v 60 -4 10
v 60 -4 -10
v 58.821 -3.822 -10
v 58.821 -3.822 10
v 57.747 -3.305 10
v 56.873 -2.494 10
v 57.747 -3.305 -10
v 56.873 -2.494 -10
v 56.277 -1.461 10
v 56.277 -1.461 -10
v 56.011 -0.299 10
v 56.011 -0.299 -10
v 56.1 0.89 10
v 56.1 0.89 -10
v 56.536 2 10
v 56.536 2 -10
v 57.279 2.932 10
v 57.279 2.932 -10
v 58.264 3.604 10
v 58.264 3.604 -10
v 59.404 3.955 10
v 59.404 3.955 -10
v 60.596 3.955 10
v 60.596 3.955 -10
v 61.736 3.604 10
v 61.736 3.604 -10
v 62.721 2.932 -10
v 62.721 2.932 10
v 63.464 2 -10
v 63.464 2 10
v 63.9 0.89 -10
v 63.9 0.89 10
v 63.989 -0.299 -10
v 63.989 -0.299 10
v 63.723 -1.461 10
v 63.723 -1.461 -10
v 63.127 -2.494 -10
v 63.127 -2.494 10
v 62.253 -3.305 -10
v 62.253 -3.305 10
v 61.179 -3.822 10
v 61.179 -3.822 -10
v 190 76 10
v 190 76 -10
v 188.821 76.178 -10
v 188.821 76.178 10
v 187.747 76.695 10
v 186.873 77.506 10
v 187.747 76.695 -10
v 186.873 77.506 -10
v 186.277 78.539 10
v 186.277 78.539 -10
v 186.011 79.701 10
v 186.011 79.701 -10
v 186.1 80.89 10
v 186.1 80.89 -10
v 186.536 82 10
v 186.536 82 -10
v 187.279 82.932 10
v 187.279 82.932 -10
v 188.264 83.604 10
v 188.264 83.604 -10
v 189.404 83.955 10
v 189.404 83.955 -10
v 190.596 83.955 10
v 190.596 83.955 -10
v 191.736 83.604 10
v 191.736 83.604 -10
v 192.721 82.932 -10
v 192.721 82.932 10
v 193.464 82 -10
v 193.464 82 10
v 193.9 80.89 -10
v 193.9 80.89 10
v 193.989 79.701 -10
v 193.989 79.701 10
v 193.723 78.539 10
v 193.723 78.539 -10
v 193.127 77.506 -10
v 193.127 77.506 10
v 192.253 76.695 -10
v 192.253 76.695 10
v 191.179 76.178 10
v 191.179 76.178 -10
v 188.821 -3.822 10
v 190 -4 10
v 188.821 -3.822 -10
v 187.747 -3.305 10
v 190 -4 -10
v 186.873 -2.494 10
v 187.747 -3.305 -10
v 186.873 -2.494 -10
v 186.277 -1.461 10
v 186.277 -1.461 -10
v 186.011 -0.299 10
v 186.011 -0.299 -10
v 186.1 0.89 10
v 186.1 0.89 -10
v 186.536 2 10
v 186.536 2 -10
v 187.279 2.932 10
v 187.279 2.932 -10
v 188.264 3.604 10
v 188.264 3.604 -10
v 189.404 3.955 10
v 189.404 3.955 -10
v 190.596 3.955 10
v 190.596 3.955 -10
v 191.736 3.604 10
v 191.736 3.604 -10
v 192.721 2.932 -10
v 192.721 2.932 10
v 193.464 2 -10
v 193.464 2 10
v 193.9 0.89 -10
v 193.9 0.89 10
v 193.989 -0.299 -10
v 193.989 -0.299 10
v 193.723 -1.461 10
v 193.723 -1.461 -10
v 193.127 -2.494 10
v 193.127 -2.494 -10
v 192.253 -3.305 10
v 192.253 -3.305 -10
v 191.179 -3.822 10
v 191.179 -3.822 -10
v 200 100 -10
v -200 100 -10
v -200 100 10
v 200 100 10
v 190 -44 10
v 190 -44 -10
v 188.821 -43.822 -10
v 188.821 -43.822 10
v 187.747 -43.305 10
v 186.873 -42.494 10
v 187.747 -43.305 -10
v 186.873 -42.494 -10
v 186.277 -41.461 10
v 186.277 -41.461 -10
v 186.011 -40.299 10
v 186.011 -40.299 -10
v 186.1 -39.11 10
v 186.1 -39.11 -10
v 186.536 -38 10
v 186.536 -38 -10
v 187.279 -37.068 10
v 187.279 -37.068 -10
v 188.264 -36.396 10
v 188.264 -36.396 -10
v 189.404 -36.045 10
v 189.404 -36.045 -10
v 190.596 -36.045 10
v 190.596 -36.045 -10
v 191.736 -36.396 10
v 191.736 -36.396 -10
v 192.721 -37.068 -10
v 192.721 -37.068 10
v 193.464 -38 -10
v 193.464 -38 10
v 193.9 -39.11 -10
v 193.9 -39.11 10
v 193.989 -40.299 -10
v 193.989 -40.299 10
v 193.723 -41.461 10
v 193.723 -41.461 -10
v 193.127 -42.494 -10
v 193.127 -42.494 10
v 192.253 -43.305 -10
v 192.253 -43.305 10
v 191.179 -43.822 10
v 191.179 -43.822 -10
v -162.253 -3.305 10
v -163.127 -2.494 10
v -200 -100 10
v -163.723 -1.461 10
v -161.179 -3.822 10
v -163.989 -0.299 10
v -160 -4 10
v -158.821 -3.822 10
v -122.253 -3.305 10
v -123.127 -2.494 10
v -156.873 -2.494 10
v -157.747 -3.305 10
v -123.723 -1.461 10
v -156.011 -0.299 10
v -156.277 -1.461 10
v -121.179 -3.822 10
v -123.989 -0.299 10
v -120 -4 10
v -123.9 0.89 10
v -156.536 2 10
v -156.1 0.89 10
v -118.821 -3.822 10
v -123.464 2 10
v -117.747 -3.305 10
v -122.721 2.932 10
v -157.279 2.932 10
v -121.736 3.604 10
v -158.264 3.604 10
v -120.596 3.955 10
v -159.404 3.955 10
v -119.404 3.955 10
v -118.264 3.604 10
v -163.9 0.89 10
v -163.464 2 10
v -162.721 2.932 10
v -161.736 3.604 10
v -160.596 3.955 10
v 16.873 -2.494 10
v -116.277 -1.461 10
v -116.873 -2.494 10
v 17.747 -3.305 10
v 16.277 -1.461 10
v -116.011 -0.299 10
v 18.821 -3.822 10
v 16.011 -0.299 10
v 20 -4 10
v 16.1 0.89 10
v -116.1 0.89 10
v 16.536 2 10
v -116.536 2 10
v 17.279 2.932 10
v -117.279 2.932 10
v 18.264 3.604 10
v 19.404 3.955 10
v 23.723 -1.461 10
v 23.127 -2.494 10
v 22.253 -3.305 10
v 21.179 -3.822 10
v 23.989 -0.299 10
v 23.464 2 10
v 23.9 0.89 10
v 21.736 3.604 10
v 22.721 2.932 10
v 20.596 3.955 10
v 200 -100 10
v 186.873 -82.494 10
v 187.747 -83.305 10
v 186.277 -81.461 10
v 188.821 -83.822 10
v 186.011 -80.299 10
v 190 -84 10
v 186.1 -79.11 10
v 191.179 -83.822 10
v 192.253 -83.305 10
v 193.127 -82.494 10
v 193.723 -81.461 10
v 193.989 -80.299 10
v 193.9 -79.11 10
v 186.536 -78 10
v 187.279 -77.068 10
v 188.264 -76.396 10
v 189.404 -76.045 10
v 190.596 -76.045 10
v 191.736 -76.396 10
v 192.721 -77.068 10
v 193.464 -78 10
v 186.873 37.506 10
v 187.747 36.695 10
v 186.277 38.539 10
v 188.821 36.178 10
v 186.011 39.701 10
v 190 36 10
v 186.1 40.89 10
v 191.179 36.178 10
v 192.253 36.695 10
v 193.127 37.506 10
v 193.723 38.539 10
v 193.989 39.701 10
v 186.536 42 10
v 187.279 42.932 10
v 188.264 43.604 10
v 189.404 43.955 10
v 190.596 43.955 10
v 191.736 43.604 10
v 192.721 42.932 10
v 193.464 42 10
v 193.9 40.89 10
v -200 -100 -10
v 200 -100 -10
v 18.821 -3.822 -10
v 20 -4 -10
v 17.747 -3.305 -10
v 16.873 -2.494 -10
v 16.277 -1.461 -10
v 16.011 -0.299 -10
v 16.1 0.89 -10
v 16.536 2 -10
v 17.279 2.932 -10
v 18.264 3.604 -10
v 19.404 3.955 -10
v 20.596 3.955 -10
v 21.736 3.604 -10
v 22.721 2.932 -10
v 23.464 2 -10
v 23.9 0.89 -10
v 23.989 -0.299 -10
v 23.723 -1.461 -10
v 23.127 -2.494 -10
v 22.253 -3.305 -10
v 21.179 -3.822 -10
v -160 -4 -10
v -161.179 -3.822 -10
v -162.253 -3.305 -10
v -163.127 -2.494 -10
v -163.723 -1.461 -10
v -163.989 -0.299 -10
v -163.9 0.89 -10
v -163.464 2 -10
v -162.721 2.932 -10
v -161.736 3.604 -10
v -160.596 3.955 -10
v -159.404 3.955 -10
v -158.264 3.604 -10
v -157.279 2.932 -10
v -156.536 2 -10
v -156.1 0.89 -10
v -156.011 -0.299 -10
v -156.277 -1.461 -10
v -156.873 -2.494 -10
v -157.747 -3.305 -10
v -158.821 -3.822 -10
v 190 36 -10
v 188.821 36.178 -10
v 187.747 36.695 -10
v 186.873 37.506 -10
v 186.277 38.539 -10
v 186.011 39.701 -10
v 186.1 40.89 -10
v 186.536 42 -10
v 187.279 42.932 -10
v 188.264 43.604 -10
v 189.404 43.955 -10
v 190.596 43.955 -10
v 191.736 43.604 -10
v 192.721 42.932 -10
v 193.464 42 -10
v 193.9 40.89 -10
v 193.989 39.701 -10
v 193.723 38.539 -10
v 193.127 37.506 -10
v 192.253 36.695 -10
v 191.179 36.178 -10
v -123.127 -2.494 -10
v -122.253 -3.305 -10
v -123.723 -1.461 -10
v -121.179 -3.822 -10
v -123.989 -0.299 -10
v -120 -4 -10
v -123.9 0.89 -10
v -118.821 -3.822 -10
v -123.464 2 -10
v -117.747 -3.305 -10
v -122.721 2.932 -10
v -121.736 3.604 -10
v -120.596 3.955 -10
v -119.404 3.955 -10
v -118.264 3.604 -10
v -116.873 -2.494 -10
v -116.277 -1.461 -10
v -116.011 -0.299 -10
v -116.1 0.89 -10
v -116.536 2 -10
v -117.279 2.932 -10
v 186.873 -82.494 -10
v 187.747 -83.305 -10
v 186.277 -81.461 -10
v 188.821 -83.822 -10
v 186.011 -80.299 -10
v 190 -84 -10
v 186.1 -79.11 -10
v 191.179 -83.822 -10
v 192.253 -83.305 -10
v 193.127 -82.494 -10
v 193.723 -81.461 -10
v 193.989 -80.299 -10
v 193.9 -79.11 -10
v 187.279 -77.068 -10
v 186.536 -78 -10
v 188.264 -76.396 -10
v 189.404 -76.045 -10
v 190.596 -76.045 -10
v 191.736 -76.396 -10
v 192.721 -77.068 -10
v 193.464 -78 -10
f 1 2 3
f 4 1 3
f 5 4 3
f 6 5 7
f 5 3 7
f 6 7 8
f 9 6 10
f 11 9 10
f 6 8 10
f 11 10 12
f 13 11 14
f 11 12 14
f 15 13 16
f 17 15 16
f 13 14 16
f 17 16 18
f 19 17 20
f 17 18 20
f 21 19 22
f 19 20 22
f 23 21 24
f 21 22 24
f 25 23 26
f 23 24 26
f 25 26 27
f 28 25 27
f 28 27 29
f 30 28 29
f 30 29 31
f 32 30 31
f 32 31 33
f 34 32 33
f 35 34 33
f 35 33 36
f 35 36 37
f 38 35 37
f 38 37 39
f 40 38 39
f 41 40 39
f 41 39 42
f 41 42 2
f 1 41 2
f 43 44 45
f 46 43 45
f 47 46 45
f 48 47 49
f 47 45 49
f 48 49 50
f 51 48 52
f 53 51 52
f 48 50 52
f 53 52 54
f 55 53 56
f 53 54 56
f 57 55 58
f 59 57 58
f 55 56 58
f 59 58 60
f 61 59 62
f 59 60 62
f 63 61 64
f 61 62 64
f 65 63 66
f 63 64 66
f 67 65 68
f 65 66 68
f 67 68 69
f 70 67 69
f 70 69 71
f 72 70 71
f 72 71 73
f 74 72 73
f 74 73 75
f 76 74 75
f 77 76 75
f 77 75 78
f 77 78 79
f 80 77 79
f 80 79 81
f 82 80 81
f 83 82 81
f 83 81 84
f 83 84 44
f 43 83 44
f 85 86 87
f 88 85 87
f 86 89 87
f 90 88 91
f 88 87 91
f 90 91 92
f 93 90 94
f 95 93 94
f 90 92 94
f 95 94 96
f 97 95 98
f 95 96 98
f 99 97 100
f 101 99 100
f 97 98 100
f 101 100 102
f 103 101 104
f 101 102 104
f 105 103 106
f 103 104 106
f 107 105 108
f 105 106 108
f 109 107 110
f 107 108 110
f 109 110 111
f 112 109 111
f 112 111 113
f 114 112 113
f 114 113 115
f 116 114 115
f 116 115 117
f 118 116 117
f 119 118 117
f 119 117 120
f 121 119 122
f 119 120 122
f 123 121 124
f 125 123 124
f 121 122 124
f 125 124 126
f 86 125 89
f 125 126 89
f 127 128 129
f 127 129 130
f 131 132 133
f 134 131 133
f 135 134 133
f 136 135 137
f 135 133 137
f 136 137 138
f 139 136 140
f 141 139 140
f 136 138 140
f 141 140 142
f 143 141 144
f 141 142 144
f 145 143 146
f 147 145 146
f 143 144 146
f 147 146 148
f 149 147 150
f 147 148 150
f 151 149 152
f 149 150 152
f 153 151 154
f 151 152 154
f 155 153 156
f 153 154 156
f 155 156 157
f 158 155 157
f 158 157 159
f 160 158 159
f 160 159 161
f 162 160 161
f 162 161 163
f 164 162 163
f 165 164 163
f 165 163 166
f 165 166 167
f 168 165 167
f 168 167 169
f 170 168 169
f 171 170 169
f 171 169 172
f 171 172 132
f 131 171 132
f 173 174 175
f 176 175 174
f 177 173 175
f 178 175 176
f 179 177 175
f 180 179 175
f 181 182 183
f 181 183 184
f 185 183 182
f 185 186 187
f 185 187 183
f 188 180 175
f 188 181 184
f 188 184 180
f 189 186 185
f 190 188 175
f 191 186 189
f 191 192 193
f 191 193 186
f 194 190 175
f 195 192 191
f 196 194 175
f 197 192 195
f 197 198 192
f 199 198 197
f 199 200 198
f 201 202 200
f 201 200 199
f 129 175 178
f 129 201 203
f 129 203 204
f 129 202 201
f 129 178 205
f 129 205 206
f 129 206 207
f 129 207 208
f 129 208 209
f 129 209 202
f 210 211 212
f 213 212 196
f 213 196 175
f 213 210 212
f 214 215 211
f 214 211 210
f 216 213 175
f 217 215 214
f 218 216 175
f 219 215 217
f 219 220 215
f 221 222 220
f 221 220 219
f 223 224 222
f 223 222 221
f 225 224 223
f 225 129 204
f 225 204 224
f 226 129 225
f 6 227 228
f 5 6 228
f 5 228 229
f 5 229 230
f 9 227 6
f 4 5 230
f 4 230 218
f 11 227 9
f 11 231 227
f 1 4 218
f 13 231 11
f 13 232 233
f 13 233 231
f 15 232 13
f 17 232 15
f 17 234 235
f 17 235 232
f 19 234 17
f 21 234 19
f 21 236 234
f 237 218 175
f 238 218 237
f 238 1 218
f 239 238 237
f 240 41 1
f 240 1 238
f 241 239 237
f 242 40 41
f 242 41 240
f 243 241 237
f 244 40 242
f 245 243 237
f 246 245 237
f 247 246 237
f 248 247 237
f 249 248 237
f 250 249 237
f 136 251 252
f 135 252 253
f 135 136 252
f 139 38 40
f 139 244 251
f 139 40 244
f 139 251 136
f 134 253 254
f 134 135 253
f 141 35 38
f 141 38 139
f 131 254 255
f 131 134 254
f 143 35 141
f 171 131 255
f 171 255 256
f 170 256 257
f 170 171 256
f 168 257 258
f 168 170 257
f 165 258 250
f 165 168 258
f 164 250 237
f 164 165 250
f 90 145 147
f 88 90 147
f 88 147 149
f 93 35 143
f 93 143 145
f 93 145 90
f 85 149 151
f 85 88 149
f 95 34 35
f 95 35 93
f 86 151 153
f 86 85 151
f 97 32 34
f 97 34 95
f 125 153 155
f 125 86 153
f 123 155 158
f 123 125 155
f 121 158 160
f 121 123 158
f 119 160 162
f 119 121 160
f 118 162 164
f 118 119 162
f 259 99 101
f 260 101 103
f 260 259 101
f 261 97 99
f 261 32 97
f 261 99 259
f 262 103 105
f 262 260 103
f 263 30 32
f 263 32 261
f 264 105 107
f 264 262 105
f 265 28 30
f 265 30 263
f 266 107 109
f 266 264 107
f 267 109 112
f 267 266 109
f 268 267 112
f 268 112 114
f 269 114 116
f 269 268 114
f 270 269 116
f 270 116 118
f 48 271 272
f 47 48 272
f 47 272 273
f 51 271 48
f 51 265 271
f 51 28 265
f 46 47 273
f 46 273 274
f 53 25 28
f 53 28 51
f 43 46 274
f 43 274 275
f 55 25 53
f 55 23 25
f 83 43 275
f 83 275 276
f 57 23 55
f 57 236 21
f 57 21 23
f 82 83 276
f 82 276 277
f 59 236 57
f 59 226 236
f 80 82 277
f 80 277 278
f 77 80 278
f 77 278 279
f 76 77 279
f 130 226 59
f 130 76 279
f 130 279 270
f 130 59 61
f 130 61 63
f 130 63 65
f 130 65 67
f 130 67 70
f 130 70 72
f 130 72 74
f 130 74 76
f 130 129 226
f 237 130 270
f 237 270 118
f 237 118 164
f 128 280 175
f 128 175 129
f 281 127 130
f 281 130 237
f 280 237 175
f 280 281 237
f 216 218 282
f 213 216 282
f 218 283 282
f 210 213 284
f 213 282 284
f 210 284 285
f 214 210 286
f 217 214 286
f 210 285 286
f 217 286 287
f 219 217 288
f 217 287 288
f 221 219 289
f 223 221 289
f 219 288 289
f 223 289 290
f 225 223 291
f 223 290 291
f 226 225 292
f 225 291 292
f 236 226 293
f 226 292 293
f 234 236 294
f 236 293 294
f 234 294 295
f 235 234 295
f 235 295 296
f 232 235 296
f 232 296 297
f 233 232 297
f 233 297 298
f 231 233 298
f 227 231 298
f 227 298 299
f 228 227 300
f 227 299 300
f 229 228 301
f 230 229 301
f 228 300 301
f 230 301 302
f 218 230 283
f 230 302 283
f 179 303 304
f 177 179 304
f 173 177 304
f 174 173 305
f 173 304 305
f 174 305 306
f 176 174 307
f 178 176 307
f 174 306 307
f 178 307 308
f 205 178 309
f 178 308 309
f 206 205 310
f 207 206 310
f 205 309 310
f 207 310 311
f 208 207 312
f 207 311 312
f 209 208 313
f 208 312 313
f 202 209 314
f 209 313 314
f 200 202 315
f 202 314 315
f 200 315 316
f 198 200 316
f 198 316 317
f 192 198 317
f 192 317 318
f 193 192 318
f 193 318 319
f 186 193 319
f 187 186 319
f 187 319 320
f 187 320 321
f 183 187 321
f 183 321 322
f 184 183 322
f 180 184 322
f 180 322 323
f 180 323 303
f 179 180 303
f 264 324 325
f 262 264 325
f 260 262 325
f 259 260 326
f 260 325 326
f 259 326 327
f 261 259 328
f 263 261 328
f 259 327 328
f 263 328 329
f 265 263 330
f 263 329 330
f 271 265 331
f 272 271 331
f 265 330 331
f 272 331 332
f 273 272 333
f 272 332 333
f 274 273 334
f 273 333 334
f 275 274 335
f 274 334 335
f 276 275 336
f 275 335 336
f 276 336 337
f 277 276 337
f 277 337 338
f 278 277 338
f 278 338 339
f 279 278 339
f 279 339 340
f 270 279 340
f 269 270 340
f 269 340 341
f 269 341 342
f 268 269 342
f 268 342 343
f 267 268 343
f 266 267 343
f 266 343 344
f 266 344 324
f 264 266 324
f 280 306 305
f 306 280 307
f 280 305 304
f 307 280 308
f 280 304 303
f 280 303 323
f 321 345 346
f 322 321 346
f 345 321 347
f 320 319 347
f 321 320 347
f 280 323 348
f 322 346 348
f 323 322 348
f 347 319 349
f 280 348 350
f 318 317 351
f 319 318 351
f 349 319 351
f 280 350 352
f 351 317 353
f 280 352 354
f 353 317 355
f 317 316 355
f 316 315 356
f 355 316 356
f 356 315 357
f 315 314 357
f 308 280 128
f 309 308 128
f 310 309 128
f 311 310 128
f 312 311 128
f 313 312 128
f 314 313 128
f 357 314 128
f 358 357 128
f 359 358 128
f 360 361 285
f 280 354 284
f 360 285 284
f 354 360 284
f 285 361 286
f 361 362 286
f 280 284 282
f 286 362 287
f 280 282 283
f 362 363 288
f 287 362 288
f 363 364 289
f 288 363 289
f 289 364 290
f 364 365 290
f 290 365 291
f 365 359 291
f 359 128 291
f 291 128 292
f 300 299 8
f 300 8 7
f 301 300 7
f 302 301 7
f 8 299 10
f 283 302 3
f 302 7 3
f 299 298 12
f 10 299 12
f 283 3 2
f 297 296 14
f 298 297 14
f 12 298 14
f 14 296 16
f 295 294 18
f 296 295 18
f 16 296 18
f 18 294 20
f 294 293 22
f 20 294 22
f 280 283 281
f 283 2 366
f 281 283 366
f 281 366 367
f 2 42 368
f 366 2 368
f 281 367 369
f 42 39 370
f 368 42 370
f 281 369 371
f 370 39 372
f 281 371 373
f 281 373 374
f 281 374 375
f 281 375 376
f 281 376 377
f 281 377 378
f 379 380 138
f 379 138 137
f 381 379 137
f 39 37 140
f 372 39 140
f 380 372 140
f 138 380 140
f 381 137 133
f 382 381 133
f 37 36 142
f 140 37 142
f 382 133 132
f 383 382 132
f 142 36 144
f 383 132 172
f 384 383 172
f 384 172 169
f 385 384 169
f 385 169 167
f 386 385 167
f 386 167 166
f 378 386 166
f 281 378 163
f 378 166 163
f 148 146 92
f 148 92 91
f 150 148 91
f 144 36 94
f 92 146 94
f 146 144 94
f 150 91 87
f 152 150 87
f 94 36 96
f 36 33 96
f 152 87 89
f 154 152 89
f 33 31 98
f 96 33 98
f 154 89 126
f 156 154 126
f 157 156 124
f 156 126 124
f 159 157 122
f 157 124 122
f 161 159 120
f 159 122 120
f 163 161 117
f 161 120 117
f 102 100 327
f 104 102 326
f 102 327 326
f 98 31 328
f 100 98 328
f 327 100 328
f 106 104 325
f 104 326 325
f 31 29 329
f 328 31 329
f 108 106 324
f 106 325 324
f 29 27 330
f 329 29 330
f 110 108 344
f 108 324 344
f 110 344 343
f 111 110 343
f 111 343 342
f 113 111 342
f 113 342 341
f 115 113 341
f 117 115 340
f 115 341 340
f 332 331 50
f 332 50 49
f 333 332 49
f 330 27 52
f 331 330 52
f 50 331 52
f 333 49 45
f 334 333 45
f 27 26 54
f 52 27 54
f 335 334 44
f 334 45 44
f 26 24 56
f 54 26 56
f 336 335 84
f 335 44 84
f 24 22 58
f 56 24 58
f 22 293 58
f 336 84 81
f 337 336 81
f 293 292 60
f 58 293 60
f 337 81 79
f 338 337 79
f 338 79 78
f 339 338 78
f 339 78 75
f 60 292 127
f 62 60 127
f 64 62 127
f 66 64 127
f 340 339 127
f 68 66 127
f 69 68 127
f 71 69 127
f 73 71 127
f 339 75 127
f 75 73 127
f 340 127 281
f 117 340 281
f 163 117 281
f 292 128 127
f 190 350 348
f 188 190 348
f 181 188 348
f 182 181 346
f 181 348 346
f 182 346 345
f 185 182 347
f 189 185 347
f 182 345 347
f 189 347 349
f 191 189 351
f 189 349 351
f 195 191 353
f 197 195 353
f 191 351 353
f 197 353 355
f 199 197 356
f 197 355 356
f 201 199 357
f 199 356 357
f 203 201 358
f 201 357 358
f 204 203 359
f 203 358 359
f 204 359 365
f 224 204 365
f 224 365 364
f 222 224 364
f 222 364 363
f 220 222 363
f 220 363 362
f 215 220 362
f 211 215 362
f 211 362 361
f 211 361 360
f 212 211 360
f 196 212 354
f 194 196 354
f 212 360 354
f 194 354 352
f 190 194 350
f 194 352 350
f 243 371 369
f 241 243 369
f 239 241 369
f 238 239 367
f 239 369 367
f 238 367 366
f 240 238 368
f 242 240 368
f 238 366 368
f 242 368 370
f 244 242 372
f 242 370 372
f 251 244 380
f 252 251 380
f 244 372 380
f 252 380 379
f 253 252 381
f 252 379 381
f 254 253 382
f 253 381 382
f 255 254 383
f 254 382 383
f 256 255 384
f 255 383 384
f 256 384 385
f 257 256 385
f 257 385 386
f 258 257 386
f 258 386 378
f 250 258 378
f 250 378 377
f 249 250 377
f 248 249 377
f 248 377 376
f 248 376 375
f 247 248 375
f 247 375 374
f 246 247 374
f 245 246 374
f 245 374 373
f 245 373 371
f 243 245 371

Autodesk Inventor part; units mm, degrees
ref_plane "YZ Plane" through (0, 0, 0) normal (1, 0, 0) x (0, 1, 0)
ref_plane "XZ Plane" through (0, 0, 0) normal (0, 1, 0) x (-1, 0, 0)
ref_plane "XY Plane" through (0, 0, 0) normal (0, 0, 1) x (1, 0, 0)
sketch "Sketch1" plane through (0, 0, 0) normal (0, 0, 1) x (1, 0, 0)
  line L0 (-200, 100) -> (200, 100)
  line L1 (200, 100) -> (200, -100)
  line L2 (200, -100) -> (-200, -100)
  line L3 (-200, -100) -> (-200, 100)
  point P0 (0, 0)
  point P1 (0, 100)
  point P2 (-200, 0)
  dimension "d0" = 400
  dimension "d1" = 200
extrude "Extrusion1" add sketch "Sketch1" along normal mid plane 20
sketch "Sketch10" plane through (0, 0, 10) normal (0, 0, 1) x (1, 0, 0)
  line L0 (-200, 100) -> (-200, -100) projected
  point P0 (0, 0)
  point P1 (-160, 0)
  dimension "d53" = 40
hole "Hole1" at (-160, 0, 10) direction (0, 0, -1) diameter 8 end through all
pattern_linear "Rectangular Pattern1" count 2 spacing 40 along (1, 0, 0) count 2 spacing 180 along (1, 0, 0) of "Hole1"
sketch "Sketch11" plane through (0, 0, 10) normal (0, 0, 1) x (1, 0, 0)
  line L0 (200, -100) -> (200, 100) projected
  point P0 (0, 0)
  point P1 (190, 0)
  point P2 (200, 0)
  dimension "d57" = 10
hole "Hole2" at (190, 0, 10) direction (0, 0, -1) diameter 8 end through all
pattern_linear "Rectangular Pattern2" count 5 spacing 40 along (0, 1, 0) of "Hole2" first direction both ways yes
properties part number "0005-10-024" material "Wood (Maple)"
